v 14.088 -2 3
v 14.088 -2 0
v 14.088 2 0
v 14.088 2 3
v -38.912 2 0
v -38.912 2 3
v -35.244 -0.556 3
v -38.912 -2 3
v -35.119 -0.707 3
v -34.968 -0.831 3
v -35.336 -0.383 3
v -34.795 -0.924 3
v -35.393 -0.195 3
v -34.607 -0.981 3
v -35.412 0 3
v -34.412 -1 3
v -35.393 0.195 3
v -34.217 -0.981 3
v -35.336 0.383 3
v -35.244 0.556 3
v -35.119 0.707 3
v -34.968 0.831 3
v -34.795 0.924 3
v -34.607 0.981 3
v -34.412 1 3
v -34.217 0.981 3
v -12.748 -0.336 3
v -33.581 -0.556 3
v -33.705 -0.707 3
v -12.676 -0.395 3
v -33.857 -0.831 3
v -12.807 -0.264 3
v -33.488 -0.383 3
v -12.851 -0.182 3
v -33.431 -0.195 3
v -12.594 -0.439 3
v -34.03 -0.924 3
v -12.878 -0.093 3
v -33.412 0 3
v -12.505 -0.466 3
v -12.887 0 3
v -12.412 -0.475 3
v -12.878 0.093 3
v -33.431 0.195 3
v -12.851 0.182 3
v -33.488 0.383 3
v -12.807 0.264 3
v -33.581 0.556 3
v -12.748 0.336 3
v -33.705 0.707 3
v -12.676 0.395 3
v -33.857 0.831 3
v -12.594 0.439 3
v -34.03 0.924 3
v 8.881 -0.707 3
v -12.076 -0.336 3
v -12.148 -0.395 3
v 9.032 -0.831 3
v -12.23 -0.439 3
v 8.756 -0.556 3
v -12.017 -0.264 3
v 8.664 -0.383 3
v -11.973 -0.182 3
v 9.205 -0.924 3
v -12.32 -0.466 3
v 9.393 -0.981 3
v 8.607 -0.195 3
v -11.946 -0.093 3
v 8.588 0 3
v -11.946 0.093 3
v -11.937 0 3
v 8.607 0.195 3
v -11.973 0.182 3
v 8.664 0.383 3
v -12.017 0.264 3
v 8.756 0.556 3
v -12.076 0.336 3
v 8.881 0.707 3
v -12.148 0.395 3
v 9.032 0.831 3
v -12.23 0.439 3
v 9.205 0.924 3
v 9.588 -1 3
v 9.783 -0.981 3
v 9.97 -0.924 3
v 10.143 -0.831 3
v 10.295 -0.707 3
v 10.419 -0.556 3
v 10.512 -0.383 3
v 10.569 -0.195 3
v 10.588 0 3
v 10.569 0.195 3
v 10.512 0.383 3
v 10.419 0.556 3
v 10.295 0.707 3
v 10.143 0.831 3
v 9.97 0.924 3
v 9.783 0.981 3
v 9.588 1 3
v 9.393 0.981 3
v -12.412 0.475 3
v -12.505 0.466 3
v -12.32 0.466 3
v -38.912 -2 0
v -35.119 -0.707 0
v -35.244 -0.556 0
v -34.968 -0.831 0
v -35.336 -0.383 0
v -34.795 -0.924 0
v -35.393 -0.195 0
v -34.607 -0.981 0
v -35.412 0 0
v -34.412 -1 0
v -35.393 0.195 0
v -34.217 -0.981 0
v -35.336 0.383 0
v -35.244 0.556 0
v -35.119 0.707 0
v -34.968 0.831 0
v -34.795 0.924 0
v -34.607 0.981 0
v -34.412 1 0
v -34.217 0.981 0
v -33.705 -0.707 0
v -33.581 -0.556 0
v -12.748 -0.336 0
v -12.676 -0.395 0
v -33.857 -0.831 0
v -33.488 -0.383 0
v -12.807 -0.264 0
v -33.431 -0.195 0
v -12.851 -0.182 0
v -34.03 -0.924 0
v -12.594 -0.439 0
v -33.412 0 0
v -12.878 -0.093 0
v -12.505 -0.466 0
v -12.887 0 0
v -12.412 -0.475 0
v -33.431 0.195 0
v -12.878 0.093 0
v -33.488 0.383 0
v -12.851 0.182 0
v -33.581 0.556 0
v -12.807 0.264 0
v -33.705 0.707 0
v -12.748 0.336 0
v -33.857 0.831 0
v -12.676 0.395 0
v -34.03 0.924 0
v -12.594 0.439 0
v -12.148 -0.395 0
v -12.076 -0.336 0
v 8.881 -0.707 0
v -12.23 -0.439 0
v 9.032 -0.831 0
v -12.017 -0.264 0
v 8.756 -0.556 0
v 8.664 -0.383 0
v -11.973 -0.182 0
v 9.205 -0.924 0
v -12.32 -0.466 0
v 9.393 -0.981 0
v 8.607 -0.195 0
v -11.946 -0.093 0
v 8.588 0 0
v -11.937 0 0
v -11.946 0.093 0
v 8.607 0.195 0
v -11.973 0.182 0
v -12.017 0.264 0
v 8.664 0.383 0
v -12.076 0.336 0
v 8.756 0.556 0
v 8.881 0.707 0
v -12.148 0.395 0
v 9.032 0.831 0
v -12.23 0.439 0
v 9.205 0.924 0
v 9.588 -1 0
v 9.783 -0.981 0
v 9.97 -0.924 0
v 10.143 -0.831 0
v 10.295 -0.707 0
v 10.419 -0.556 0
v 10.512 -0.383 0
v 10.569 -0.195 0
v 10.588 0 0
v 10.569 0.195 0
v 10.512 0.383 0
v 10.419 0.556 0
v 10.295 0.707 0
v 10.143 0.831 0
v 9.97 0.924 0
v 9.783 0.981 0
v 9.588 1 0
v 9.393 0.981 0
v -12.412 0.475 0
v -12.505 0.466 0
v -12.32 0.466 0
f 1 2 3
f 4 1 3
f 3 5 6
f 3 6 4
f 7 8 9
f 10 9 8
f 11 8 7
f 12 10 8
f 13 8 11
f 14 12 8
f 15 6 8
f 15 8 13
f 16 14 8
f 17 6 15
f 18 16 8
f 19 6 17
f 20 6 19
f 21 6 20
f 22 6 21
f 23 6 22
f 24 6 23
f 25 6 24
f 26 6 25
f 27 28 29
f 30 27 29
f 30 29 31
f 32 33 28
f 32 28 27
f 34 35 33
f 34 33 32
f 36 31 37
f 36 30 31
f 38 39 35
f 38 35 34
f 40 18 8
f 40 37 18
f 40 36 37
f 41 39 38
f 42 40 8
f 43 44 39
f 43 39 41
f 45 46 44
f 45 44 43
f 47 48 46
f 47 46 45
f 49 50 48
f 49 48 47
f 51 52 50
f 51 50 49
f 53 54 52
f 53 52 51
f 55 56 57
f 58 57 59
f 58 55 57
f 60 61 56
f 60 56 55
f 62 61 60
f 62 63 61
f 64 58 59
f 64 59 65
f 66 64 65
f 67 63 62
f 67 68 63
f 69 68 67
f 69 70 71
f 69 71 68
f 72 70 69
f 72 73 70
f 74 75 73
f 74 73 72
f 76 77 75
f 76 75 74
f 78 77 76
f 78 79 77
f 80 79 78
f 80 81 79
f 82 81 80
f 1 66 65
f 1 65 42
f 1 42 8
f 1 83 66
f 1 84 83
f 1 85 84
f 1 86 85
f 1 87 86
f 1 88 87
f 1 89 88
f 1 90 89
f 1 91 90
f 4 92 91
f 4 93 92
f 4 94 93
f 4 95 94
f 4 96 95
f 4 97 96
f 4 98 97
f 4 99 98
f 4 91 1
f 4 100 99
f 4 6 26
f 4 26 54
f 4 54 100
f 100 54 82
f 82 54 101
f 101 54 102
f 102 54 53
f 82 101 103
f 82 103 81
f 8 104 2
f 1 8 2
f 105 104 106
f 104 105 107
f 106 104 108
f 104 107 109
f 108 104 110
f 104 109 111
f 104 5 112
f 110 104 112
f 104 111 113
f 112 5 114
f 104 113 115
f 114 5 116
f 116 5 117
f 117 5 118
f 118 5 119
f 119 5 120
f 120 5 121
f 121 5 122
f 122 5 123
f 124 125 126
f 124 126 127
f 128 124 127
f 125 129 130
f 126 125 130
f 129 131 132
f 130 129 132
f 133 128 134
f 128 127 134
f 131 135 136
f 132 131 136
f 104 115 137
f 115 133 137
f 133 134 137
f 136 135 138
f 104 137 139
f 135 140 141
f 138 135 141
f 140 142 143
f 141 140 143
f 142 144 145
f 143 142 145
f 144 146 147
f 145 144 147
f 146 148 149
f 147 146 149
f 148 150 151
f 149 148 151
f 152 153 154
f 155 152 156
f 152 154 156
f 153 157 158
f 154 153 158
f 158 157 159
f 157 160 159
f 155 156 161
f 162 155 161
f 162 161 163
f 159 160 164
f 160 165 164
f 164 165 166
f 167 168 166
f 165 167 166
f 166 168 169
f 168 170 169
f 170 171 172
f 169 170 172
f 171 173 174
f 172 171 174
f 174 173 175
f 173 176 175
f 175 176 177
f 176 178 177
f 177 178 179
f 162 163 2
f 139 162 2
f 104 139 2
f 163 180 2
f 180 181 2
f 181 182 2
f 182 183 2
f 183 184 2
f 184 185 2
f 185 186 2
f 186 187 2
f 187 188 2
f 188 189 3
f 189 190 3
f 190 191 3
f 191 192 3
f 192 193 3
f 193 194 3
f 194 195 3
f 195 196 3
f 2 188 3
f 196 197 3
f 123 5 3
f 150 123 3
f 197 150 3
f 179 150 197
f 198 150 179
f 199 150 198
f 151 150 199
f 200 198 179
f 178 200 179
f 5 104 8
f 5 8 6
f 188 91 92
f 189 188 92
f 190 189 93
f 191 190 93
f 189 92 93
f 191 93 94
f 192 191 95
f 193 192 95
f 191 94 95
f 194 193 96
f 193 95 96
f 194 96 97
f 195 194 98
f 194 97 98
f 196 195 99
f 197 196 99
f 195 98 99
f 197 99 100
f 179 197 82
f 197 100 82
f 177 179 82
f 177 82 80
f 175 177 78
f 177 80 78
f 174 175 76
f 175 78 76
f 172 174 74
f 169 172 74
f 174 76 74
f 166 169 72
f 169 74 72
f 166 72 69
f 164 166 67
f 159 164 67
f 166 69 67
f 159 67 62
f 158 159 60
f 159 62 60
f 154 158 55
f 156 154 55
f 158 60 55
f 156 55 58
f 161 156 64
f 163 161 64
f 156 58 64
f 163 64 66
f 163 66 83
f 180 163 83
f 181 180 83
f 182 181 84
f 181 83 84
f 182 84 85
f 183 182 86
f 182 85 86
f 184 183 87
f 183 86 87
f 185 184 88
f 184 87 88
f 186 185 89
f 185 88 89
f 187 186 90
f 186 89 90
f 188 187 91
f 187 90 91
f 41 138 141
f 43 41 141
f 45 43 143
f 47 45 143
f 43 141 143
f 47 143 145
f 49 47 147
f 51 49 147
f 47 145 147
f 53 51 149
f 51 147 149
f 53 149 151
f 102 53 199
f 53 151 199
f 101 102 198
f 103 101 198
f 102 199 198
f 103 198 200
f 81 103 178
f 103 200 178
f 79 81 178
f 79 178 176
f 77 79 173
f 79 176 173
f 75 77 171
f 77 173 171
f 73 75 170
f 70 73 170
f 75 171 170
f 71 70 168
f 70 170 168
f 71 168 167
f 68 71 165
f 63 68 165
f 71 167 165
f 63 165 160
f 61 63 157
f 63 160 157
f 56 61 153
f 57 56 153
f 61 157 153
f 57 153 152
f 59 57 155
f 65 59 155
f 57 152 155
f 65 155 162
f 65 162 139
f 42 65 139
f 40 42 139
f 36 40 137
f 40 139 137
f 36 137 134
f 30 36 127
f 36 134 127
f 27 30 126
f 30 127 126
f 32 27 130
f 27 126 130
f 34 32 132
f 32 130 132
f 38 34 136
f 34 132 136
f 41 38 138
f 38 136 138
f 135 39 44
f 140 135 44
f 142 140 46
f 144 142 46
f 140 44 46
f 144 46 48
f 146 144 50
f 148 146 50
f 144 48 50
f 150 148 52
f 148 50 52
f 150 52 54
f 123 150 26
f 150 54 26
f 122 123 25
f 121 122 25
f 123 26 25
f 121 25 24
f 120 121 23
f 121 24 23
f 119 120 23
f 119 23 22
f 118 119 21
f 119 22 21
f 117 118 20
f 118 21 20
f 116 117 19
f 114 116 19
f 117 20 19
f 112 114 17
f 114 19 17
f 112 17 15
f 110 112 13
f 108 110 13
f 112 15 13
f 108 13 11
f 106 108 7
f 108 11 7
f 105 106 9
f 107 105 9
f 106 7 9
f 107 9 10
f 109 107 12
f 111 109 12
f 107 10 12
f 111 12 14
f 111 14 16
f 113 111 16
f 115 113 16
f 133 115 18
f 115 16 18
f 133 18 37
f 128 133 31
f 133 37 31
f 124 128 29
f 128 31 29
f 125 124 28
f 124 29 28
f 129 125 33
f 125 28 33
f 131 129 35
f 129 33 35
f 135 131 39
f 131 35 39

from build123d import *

# Parameters (mm, degrees)
SKETCH1_W           = 53
SKETCH1_H           = 4
BOSS_EXTRUDE2_DEPTH = 3
SKETCH3_R           = 1
CUT_EXTRUDE2_DEPTH  = 3
SKETCH4_R           = 0.475
CUT_EXTRUDE3_DEPTH  = 3


with BuildPart() as part:
    # Sketch1 → Boss-Extrude2 (new body)
    with BuildSketch(Plane.XY):
        with Locations((-12.412207578, 0)):
            Rectangle(SKETCH1_W, SKETCH1_H)
    extrude(amount=BOSS_EXTRUDE2_DEPTH)

    # Sketch3 → Cut-Extrude2 (cut)
    with BuildSketch(Plane.XY.offset(3)):
        with Locations((-34.412207578, 0)):
            Circle(SKETCH3_R)
        with Locations((9.587792422, 0)):
            Circle(SKETCH3_R)
    extrude(amount=-CUT_EXTRUDE2_DEPTH, mode=Mode.SUBTRACT)

    # Sketch4 → Cut-Extrude3 (cut)
    with BuildSketch(Plane(origin=(0, 0, 0), x_dir=(-1, 0, 0), z_dir=(0, 0, -1))):
        with Locations((12.412207578, 0)):
            Circle(SKETCH4_R)
    extrude(amount=-CUT_EXTRUDE3_DEPTH, mode=Mode.SUBTRACT)


solid = part.part
